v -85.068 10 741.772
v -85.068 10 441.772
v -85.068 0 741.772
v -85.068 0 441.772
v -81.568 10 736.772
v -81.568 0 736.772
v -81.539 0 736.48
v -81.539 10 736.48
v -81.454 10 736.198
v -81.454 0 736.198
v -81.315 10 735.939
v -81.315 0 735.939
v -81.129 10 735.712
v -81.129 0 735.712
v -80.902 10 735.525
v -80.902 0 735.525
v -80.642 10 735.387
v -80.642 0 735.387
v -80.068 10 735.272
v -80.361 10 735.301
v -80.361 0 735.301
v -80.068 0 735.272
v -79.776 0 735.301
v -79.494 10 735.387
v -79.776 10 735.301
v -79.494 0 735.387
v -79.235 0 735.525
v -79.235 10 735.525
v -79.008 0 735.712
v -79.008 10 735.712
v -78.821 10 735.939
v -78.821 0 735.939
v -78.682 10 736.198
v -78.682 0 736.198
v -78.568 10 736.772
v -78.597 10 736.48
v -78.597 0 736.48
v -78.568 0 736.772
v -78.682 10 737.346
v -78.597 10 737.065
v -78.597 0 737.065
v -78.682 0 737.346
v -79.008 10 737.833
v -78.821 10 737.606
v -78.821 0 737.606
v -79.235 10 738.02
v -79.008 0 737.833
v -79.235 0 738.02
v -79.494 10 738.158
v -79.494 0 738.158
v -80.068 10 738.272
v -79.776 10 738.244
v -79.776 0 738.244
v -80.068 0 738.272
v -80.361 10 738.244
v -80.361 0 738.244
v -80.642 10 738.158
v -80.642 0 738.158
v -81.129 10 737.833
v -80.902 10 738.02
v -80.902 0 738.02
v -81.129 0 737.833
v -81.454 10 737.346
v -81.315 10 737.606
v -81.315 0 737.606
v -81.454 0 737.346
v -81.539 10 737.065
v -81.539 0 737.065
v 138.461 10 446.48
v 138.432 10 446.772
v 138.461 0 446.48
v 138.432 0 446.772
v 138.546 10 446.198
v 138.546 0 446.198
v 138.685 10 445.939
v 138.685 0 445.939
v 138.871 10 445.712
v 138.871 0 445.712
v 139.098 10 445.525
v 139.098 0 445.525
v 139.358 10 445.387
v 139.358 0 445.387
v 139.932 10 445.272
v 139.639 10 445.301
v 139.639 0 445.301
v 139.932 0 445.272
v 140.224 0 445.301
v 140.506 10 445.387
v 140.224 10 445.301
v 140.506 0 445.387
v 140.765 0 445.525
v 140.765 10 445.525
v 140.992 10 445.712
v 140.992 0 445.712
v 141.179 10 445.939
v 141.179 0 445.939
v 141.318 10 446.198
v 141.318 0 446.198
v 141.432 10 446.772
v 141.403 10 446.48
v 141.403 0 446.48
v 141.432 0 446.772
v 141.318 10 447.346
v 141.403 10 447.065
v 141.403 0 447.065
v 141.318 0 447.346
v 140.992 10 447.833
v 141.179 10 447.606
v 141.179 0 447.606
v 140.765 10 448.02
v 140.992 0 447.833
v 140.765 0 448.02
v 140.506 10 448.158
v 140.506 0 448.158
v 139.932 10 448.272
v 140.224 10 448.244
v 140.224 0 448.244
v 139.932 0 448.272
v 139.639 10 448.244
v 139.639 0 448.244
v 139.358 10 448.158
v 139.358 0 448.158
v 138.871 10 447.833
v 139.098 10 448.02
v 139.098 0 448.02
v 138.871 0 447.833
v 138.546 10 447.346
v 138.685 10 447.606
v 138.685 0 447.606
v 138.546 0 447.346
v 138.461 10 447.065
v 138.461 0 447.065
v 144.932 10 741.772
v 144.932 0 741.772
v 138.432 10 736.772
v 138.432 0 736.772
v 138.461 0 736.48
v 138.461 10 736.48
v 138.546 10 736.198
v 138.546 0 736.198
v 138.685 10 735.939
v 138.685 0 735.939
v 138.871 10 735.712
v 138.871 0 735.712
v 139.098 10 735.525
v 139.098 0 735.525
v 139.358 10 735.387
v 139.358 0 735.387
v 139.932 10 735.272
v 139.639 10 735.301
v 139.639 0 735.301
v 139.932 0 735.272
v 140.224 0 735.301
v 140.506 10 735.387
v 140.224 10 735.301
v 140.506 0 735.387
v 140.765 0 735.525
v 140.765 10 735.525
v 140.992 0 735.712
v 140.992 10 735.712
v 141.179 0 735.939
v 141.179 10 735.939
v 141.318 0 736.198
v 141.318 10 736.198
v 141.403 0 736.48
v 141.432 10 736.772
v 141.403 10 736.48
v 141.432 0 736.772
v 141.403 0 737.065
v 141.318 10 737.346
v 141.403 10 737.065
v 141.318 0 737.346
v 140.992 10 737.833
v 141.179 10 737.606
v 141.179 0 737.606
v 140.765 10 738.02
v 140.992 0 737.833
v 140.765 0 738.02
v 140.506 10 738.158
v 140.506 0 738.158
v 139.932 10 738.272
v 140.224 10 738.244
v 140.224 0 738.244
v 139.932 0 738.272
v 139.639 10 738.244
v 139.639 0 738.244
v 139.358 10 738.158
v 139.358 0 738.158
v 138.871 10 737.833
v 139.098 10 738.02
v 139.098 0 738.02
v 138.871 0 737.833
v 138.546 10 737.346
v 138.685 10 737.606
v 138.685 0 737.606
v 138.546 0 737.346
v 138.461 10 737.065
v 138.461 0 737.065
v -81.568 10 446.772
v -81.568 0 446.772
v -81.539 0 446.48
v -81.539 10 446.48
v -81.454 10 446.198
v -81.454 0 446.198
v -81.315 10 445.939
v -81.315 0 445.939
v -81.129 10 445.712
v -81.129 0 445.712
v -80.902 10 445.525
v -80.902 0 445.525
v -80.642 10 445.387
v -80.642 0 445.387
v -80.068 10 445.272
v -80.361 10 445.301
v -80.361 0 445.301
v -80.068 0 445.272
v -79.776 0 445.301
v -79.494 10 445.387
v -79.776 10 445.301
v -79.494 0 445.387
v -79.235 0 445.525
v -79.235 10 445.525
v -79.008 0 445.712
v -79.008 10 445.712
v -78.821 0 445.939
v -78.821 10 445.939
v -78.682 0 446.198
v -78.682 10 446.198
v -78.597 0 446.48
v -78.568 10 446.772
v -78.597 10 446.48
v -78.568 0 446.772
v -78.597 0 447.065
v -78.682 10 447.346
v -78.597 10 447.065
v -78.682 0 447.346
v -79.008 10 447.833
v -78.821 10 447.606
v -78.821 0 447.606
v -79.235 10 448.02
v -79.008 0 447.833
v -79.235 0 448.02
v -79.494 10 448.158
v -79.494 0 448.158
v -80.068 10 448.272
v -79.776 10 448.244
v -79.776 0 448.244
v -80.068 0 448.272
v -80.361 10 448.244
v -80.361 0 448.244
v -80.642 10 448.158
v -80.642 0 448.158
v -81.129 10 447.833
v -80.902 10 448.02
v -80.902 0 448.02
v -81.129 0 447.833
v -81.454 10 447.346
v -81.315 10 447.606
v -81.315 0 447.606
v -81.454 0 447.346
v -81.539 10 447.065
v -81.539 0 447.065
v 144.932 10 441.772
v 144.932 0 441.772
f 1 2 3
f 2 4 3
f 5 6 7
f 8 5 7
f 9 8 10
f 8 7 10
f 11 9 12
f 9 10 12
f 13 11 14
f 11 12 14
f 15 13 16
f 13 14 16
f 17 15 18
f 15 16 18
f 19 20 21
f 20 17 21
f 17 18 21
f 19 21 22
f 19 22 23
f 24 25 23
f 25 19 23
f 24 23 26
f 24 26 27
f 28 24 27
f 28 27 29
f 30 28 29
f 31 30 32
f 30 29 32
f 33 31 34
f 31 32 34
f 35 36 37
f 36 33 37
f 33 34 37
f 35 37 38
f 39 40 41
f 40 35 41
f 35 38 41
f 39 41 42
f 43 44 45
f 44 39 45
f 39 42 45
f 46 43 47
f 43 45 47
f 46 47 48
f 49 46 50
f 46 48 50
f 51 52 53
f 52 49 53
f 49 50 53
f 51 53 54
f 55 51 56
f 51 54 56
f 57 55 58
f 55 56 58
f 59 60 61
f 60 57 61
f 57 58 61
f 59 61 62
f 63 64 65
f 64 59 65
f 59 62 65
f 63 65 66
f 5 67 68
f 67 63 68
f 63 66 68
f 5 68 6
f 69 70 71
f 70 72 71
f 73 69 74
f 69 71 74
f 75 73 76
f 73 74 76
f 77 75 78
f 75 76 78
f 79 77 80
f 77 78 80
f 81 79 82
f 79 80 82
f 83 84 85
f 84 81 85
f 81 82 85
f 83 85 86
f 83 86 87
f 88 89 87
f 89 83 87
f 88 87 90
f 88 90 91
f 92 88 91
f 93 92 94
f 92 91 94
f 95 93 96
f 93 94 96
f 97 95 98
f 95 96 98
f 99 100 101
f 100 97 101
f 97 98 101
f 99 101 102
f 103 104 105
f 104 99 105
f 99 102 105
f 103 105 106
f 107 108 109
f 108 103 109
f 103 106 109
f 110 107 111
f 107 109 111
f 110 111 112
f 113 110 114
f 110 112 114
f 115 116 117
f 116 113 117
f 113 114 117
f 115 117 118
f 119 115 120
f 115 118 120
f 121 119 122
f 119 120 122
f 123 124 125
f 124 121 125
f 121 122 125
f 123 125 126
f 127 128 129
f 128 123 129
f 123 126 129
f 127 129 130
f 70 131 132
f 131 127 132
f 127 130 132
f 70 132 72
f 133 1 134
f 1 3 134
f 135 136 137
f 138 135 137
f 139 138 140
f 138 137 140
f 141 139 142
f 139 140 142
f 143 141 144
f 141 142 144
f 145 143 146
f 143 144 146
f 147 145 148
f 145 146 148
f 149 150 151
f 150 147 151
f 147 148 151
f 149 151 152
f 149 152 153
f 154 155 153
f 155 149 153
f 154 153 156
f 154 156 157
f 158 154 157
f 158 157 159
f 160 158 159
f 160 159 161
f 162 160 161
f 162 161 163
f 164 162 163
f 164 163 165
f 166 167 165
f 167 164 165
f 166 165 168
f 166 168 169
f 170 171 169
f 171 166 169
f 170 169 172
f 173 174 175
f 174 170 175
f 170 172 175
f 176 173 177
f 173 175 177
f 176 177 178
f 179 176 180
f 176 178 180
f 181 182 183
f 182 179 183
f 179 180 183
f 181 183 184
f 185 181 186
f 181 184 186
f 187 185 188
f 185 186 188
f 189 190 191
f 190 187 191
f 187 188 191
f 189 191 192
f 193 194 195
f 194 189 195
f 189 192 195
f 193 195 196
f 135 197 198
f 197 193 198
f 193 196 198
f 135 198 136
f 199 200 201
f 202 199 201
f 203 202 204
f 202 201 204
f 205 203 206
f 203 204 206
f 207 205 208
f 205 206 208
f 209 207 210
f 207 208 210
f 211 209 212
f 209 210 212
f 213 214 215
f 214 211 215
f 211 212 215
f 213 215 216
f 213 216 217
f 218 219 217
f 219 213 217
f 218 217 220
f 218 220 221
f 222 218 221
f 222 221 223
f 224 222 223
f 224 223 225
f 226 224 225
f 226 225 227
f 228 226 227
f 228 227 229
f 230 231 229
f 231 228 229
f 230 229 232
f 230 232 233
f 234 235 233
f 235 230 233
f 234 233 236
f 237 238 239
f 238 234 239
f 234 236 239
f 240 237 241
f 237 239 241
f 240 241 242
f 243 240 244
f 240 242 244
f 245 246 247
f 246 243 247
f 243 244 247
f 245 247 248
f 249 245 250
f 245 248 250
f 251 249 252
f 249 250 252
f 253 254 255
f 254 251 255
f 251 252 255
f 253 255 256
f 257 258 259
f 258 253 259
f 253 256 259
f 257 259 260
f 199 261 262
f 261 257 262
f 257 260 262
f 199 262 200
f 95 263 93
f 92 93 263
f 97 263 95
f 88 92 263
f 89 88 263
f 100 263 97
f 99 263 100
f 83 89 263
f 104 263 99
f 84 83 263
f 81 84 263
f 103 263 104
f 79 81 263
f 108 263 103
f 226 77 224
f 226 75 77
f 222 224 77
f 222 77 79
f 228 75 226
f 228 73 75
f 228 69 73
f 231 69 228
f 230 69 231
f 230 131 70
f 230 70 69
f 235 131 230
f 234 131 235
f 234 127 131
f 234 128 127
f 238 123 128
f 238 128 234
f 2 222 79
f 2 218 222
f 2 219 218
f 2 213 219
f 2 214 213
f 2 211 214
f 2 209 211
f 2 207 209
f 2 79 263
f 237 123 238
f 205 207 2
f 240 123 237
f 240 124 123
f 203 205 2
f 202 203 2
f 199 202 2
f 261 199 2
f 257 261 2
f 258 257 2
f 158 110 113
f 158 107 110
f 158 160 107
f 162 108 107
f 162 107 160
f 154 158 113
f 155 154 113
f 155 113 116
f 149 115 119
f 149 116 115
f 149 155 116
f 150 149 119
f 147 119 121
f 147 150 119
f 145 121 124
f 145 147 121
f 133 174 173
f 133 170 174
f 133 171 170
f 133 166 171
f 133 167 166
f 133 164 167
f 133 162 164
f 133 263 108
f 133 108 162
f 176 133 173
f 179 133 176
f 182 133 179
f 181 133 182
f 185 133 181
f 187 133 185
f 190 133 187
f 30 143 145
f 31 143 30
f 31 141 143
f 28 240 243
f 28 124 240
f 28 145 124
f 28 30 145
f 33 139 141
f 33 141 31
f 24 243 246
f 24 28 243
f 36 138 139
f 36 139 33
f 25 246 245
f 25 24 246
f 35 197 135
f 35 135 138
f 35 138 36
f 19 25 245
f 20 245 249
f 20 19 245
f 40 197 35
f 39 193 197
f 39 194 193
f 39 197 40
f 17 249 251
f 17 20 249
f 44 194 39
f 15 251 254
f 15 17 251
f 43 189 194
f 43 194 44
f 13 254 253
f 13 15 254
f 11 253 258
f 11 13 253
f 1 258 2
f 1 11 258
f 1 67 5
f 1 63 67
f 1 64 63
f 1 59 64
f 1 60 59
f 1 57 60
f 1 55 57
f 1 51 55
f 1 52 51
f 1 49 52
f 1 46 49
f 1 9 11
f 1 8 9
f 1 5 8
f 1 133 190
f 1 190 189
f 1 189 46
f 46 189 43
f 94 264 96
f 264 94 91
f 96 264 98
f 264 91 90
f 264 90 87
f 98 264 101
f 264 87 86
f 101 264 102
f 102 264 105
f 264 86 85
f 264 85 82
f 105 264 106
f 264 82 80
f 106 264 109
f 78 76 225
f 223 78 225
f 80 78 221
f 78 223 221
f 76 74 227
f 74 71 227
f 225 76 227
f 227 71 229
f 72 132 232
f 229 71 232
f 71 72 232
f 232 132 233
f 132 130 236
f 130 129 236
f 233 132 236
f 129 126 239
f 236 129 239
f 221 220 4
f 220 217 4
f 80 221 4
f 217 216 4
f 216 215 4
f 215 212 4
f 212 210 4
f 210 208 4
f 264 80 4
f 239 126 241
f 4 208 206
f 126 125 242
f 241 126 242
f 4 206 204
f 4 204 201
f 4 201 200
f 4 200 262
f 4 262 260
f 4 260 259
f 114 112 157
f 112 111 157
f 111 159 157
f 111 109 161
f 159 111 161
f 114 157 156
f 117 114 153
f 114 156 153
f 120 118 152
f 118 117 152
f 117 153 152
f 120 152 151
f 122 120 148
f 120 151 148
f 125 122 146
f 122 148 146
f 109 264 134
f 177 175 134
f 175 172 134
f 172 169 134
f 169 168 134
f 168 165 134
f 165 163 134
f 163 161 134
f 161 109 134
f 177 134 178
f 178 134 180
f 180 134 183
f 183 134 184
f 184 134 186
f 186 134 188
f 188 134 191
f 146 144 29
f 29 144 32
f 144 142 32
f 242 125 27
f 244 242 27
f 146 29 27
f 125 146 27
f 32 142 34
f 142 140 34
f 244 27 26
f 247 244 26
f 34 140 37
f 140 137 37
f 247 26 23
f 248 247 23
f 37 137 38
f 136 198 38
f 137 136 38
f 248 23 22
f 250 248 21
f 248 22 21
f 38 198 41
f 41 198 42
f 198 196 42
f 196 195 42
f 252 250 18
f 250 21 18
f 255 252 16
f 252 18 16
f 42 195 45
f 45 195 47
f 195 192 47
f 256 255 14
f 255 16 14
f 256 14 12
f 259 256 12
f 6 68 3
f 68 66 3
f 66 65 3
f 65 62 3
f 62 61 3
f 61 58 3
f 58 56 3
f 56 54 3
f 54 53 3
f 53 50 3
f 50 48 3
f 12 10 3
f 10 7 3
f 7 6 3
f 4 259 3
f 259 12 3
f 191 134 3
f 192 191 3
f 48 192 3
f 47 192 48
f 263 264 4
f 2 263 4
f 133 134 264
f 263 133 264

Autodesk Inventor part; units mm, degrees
ref_plane "YZ Plane" through (0, 0, 0) normal (1, 0, 0) x (0, 1, 0)
ref_plane "XZ Plane" through (0, 0, 0) normal (0, 1, 0) x (-1, 0, 0)
ref_plane "XY Plane" through (0, 0, 0) normal (0, 0, 1) x (1, 0, 0)
sketch "Schizzo1" plane through (0, 0, 0) normal (0, 1, 0) x (-1, 0, 0)
  line L0 (112.9076, 150.0243) -> (-117.0924, 150.0243)
  line L1 (-117.0924, -149.9757) -> (112.9076, -149.9757)
  line L2 (112.9076, -149.9757) -> (112.9076, 150.0243)
  circle A0 centre (43.9076, 95.0243) radius 2.75
  circle A1 centre (43.9076, 65.0243) radius 2.75
  circle A2 centre (11.9076, 95.0243) radius 2.75
  circle A3 centre (11.9076, 65.0243) radius 2.75
  circle A4 centre (43.9076, -64.9757) radius 2.75
  circle A5 centre (43.9076, -94.9757) radius 2.75
  circle A6 centre (11.9076, -64.9757) radius 2.75
  circle A7 centre (11.9076, -94.9757) radius 2.75
  circle A8 centre (-16.0924, 95.0243) radius 2.75
  circle A9 centre (-16.0924, 65.0243) radius 2.75
  circle A10 centre (-48.0924, 95.0243) radius 2.75
  circle A11 centre (-48.0924, 65.0243) radius 2.75
  circle A12 centre (-16.0924, -64.9757) radius 2.75
  circle A13 centre (-16.0924, -94.9757) radius 2.75
  circle A14 centre (-48.0924, -64.9757) radius 2.75
  circle A15 centre (-48.0924, -94.9757) radius 2.75
  circle A16 centre (7.9076, 140.0243) radius 3
  circle A17 centre (-12.0924, 140.0243) radius 3
  circle A18 centre (107.9076, 145.0243) radius 1.5
  circle A19 centre (107.9076, -144.9757) radius 1.5
  circle A20 centre (-112.0924, 145.0243) radius 1.5
  circle A21 centre (-112.0924, -144.9757) radius 1.5
  line L3 (85.0682, 741.7724) -> (-144.9318, 741.7724)
  line L4 (-144.9318, 741.7724) -> (-144.9318, 441.7724)
  line L5 (-144.9318, 441.7724) -> (85.0682, 441.7724)
  line L6 (85.0682, 441.7724) -> (85.0682, 741.7724)
  circle A22 centre (80.0682, 736.7724) radius 1.5
  circle A23 centre (80.0682, 446.7724) radius 1.5
  circle A24 centre (-139.9318, 736.7724) radius 1.5
  circle A25 centre (-139.9318, 446.7724) radius 1.5
  dimension "d23" = 30
  dimension "d24" = 32
  dimension "d25" = 160
  dimension "d26" = 60
  dimension "d30" = 20
  dimension "d36" = 290
  dimension "d37" = 220
  dimension "d41" = 230
  dimension "d42" = 300
  dimension "d43" = 3
  dimension "d44" = 5
  dimension "d45" = 5
  dimension "d48" = 290
  dimension "d51" = 220
extrude "Estrusione1" add sketch "Schizzo1" along normal blind 10 contours L6 L5 L4 L3
properties part number "base di lavoro sopra"
